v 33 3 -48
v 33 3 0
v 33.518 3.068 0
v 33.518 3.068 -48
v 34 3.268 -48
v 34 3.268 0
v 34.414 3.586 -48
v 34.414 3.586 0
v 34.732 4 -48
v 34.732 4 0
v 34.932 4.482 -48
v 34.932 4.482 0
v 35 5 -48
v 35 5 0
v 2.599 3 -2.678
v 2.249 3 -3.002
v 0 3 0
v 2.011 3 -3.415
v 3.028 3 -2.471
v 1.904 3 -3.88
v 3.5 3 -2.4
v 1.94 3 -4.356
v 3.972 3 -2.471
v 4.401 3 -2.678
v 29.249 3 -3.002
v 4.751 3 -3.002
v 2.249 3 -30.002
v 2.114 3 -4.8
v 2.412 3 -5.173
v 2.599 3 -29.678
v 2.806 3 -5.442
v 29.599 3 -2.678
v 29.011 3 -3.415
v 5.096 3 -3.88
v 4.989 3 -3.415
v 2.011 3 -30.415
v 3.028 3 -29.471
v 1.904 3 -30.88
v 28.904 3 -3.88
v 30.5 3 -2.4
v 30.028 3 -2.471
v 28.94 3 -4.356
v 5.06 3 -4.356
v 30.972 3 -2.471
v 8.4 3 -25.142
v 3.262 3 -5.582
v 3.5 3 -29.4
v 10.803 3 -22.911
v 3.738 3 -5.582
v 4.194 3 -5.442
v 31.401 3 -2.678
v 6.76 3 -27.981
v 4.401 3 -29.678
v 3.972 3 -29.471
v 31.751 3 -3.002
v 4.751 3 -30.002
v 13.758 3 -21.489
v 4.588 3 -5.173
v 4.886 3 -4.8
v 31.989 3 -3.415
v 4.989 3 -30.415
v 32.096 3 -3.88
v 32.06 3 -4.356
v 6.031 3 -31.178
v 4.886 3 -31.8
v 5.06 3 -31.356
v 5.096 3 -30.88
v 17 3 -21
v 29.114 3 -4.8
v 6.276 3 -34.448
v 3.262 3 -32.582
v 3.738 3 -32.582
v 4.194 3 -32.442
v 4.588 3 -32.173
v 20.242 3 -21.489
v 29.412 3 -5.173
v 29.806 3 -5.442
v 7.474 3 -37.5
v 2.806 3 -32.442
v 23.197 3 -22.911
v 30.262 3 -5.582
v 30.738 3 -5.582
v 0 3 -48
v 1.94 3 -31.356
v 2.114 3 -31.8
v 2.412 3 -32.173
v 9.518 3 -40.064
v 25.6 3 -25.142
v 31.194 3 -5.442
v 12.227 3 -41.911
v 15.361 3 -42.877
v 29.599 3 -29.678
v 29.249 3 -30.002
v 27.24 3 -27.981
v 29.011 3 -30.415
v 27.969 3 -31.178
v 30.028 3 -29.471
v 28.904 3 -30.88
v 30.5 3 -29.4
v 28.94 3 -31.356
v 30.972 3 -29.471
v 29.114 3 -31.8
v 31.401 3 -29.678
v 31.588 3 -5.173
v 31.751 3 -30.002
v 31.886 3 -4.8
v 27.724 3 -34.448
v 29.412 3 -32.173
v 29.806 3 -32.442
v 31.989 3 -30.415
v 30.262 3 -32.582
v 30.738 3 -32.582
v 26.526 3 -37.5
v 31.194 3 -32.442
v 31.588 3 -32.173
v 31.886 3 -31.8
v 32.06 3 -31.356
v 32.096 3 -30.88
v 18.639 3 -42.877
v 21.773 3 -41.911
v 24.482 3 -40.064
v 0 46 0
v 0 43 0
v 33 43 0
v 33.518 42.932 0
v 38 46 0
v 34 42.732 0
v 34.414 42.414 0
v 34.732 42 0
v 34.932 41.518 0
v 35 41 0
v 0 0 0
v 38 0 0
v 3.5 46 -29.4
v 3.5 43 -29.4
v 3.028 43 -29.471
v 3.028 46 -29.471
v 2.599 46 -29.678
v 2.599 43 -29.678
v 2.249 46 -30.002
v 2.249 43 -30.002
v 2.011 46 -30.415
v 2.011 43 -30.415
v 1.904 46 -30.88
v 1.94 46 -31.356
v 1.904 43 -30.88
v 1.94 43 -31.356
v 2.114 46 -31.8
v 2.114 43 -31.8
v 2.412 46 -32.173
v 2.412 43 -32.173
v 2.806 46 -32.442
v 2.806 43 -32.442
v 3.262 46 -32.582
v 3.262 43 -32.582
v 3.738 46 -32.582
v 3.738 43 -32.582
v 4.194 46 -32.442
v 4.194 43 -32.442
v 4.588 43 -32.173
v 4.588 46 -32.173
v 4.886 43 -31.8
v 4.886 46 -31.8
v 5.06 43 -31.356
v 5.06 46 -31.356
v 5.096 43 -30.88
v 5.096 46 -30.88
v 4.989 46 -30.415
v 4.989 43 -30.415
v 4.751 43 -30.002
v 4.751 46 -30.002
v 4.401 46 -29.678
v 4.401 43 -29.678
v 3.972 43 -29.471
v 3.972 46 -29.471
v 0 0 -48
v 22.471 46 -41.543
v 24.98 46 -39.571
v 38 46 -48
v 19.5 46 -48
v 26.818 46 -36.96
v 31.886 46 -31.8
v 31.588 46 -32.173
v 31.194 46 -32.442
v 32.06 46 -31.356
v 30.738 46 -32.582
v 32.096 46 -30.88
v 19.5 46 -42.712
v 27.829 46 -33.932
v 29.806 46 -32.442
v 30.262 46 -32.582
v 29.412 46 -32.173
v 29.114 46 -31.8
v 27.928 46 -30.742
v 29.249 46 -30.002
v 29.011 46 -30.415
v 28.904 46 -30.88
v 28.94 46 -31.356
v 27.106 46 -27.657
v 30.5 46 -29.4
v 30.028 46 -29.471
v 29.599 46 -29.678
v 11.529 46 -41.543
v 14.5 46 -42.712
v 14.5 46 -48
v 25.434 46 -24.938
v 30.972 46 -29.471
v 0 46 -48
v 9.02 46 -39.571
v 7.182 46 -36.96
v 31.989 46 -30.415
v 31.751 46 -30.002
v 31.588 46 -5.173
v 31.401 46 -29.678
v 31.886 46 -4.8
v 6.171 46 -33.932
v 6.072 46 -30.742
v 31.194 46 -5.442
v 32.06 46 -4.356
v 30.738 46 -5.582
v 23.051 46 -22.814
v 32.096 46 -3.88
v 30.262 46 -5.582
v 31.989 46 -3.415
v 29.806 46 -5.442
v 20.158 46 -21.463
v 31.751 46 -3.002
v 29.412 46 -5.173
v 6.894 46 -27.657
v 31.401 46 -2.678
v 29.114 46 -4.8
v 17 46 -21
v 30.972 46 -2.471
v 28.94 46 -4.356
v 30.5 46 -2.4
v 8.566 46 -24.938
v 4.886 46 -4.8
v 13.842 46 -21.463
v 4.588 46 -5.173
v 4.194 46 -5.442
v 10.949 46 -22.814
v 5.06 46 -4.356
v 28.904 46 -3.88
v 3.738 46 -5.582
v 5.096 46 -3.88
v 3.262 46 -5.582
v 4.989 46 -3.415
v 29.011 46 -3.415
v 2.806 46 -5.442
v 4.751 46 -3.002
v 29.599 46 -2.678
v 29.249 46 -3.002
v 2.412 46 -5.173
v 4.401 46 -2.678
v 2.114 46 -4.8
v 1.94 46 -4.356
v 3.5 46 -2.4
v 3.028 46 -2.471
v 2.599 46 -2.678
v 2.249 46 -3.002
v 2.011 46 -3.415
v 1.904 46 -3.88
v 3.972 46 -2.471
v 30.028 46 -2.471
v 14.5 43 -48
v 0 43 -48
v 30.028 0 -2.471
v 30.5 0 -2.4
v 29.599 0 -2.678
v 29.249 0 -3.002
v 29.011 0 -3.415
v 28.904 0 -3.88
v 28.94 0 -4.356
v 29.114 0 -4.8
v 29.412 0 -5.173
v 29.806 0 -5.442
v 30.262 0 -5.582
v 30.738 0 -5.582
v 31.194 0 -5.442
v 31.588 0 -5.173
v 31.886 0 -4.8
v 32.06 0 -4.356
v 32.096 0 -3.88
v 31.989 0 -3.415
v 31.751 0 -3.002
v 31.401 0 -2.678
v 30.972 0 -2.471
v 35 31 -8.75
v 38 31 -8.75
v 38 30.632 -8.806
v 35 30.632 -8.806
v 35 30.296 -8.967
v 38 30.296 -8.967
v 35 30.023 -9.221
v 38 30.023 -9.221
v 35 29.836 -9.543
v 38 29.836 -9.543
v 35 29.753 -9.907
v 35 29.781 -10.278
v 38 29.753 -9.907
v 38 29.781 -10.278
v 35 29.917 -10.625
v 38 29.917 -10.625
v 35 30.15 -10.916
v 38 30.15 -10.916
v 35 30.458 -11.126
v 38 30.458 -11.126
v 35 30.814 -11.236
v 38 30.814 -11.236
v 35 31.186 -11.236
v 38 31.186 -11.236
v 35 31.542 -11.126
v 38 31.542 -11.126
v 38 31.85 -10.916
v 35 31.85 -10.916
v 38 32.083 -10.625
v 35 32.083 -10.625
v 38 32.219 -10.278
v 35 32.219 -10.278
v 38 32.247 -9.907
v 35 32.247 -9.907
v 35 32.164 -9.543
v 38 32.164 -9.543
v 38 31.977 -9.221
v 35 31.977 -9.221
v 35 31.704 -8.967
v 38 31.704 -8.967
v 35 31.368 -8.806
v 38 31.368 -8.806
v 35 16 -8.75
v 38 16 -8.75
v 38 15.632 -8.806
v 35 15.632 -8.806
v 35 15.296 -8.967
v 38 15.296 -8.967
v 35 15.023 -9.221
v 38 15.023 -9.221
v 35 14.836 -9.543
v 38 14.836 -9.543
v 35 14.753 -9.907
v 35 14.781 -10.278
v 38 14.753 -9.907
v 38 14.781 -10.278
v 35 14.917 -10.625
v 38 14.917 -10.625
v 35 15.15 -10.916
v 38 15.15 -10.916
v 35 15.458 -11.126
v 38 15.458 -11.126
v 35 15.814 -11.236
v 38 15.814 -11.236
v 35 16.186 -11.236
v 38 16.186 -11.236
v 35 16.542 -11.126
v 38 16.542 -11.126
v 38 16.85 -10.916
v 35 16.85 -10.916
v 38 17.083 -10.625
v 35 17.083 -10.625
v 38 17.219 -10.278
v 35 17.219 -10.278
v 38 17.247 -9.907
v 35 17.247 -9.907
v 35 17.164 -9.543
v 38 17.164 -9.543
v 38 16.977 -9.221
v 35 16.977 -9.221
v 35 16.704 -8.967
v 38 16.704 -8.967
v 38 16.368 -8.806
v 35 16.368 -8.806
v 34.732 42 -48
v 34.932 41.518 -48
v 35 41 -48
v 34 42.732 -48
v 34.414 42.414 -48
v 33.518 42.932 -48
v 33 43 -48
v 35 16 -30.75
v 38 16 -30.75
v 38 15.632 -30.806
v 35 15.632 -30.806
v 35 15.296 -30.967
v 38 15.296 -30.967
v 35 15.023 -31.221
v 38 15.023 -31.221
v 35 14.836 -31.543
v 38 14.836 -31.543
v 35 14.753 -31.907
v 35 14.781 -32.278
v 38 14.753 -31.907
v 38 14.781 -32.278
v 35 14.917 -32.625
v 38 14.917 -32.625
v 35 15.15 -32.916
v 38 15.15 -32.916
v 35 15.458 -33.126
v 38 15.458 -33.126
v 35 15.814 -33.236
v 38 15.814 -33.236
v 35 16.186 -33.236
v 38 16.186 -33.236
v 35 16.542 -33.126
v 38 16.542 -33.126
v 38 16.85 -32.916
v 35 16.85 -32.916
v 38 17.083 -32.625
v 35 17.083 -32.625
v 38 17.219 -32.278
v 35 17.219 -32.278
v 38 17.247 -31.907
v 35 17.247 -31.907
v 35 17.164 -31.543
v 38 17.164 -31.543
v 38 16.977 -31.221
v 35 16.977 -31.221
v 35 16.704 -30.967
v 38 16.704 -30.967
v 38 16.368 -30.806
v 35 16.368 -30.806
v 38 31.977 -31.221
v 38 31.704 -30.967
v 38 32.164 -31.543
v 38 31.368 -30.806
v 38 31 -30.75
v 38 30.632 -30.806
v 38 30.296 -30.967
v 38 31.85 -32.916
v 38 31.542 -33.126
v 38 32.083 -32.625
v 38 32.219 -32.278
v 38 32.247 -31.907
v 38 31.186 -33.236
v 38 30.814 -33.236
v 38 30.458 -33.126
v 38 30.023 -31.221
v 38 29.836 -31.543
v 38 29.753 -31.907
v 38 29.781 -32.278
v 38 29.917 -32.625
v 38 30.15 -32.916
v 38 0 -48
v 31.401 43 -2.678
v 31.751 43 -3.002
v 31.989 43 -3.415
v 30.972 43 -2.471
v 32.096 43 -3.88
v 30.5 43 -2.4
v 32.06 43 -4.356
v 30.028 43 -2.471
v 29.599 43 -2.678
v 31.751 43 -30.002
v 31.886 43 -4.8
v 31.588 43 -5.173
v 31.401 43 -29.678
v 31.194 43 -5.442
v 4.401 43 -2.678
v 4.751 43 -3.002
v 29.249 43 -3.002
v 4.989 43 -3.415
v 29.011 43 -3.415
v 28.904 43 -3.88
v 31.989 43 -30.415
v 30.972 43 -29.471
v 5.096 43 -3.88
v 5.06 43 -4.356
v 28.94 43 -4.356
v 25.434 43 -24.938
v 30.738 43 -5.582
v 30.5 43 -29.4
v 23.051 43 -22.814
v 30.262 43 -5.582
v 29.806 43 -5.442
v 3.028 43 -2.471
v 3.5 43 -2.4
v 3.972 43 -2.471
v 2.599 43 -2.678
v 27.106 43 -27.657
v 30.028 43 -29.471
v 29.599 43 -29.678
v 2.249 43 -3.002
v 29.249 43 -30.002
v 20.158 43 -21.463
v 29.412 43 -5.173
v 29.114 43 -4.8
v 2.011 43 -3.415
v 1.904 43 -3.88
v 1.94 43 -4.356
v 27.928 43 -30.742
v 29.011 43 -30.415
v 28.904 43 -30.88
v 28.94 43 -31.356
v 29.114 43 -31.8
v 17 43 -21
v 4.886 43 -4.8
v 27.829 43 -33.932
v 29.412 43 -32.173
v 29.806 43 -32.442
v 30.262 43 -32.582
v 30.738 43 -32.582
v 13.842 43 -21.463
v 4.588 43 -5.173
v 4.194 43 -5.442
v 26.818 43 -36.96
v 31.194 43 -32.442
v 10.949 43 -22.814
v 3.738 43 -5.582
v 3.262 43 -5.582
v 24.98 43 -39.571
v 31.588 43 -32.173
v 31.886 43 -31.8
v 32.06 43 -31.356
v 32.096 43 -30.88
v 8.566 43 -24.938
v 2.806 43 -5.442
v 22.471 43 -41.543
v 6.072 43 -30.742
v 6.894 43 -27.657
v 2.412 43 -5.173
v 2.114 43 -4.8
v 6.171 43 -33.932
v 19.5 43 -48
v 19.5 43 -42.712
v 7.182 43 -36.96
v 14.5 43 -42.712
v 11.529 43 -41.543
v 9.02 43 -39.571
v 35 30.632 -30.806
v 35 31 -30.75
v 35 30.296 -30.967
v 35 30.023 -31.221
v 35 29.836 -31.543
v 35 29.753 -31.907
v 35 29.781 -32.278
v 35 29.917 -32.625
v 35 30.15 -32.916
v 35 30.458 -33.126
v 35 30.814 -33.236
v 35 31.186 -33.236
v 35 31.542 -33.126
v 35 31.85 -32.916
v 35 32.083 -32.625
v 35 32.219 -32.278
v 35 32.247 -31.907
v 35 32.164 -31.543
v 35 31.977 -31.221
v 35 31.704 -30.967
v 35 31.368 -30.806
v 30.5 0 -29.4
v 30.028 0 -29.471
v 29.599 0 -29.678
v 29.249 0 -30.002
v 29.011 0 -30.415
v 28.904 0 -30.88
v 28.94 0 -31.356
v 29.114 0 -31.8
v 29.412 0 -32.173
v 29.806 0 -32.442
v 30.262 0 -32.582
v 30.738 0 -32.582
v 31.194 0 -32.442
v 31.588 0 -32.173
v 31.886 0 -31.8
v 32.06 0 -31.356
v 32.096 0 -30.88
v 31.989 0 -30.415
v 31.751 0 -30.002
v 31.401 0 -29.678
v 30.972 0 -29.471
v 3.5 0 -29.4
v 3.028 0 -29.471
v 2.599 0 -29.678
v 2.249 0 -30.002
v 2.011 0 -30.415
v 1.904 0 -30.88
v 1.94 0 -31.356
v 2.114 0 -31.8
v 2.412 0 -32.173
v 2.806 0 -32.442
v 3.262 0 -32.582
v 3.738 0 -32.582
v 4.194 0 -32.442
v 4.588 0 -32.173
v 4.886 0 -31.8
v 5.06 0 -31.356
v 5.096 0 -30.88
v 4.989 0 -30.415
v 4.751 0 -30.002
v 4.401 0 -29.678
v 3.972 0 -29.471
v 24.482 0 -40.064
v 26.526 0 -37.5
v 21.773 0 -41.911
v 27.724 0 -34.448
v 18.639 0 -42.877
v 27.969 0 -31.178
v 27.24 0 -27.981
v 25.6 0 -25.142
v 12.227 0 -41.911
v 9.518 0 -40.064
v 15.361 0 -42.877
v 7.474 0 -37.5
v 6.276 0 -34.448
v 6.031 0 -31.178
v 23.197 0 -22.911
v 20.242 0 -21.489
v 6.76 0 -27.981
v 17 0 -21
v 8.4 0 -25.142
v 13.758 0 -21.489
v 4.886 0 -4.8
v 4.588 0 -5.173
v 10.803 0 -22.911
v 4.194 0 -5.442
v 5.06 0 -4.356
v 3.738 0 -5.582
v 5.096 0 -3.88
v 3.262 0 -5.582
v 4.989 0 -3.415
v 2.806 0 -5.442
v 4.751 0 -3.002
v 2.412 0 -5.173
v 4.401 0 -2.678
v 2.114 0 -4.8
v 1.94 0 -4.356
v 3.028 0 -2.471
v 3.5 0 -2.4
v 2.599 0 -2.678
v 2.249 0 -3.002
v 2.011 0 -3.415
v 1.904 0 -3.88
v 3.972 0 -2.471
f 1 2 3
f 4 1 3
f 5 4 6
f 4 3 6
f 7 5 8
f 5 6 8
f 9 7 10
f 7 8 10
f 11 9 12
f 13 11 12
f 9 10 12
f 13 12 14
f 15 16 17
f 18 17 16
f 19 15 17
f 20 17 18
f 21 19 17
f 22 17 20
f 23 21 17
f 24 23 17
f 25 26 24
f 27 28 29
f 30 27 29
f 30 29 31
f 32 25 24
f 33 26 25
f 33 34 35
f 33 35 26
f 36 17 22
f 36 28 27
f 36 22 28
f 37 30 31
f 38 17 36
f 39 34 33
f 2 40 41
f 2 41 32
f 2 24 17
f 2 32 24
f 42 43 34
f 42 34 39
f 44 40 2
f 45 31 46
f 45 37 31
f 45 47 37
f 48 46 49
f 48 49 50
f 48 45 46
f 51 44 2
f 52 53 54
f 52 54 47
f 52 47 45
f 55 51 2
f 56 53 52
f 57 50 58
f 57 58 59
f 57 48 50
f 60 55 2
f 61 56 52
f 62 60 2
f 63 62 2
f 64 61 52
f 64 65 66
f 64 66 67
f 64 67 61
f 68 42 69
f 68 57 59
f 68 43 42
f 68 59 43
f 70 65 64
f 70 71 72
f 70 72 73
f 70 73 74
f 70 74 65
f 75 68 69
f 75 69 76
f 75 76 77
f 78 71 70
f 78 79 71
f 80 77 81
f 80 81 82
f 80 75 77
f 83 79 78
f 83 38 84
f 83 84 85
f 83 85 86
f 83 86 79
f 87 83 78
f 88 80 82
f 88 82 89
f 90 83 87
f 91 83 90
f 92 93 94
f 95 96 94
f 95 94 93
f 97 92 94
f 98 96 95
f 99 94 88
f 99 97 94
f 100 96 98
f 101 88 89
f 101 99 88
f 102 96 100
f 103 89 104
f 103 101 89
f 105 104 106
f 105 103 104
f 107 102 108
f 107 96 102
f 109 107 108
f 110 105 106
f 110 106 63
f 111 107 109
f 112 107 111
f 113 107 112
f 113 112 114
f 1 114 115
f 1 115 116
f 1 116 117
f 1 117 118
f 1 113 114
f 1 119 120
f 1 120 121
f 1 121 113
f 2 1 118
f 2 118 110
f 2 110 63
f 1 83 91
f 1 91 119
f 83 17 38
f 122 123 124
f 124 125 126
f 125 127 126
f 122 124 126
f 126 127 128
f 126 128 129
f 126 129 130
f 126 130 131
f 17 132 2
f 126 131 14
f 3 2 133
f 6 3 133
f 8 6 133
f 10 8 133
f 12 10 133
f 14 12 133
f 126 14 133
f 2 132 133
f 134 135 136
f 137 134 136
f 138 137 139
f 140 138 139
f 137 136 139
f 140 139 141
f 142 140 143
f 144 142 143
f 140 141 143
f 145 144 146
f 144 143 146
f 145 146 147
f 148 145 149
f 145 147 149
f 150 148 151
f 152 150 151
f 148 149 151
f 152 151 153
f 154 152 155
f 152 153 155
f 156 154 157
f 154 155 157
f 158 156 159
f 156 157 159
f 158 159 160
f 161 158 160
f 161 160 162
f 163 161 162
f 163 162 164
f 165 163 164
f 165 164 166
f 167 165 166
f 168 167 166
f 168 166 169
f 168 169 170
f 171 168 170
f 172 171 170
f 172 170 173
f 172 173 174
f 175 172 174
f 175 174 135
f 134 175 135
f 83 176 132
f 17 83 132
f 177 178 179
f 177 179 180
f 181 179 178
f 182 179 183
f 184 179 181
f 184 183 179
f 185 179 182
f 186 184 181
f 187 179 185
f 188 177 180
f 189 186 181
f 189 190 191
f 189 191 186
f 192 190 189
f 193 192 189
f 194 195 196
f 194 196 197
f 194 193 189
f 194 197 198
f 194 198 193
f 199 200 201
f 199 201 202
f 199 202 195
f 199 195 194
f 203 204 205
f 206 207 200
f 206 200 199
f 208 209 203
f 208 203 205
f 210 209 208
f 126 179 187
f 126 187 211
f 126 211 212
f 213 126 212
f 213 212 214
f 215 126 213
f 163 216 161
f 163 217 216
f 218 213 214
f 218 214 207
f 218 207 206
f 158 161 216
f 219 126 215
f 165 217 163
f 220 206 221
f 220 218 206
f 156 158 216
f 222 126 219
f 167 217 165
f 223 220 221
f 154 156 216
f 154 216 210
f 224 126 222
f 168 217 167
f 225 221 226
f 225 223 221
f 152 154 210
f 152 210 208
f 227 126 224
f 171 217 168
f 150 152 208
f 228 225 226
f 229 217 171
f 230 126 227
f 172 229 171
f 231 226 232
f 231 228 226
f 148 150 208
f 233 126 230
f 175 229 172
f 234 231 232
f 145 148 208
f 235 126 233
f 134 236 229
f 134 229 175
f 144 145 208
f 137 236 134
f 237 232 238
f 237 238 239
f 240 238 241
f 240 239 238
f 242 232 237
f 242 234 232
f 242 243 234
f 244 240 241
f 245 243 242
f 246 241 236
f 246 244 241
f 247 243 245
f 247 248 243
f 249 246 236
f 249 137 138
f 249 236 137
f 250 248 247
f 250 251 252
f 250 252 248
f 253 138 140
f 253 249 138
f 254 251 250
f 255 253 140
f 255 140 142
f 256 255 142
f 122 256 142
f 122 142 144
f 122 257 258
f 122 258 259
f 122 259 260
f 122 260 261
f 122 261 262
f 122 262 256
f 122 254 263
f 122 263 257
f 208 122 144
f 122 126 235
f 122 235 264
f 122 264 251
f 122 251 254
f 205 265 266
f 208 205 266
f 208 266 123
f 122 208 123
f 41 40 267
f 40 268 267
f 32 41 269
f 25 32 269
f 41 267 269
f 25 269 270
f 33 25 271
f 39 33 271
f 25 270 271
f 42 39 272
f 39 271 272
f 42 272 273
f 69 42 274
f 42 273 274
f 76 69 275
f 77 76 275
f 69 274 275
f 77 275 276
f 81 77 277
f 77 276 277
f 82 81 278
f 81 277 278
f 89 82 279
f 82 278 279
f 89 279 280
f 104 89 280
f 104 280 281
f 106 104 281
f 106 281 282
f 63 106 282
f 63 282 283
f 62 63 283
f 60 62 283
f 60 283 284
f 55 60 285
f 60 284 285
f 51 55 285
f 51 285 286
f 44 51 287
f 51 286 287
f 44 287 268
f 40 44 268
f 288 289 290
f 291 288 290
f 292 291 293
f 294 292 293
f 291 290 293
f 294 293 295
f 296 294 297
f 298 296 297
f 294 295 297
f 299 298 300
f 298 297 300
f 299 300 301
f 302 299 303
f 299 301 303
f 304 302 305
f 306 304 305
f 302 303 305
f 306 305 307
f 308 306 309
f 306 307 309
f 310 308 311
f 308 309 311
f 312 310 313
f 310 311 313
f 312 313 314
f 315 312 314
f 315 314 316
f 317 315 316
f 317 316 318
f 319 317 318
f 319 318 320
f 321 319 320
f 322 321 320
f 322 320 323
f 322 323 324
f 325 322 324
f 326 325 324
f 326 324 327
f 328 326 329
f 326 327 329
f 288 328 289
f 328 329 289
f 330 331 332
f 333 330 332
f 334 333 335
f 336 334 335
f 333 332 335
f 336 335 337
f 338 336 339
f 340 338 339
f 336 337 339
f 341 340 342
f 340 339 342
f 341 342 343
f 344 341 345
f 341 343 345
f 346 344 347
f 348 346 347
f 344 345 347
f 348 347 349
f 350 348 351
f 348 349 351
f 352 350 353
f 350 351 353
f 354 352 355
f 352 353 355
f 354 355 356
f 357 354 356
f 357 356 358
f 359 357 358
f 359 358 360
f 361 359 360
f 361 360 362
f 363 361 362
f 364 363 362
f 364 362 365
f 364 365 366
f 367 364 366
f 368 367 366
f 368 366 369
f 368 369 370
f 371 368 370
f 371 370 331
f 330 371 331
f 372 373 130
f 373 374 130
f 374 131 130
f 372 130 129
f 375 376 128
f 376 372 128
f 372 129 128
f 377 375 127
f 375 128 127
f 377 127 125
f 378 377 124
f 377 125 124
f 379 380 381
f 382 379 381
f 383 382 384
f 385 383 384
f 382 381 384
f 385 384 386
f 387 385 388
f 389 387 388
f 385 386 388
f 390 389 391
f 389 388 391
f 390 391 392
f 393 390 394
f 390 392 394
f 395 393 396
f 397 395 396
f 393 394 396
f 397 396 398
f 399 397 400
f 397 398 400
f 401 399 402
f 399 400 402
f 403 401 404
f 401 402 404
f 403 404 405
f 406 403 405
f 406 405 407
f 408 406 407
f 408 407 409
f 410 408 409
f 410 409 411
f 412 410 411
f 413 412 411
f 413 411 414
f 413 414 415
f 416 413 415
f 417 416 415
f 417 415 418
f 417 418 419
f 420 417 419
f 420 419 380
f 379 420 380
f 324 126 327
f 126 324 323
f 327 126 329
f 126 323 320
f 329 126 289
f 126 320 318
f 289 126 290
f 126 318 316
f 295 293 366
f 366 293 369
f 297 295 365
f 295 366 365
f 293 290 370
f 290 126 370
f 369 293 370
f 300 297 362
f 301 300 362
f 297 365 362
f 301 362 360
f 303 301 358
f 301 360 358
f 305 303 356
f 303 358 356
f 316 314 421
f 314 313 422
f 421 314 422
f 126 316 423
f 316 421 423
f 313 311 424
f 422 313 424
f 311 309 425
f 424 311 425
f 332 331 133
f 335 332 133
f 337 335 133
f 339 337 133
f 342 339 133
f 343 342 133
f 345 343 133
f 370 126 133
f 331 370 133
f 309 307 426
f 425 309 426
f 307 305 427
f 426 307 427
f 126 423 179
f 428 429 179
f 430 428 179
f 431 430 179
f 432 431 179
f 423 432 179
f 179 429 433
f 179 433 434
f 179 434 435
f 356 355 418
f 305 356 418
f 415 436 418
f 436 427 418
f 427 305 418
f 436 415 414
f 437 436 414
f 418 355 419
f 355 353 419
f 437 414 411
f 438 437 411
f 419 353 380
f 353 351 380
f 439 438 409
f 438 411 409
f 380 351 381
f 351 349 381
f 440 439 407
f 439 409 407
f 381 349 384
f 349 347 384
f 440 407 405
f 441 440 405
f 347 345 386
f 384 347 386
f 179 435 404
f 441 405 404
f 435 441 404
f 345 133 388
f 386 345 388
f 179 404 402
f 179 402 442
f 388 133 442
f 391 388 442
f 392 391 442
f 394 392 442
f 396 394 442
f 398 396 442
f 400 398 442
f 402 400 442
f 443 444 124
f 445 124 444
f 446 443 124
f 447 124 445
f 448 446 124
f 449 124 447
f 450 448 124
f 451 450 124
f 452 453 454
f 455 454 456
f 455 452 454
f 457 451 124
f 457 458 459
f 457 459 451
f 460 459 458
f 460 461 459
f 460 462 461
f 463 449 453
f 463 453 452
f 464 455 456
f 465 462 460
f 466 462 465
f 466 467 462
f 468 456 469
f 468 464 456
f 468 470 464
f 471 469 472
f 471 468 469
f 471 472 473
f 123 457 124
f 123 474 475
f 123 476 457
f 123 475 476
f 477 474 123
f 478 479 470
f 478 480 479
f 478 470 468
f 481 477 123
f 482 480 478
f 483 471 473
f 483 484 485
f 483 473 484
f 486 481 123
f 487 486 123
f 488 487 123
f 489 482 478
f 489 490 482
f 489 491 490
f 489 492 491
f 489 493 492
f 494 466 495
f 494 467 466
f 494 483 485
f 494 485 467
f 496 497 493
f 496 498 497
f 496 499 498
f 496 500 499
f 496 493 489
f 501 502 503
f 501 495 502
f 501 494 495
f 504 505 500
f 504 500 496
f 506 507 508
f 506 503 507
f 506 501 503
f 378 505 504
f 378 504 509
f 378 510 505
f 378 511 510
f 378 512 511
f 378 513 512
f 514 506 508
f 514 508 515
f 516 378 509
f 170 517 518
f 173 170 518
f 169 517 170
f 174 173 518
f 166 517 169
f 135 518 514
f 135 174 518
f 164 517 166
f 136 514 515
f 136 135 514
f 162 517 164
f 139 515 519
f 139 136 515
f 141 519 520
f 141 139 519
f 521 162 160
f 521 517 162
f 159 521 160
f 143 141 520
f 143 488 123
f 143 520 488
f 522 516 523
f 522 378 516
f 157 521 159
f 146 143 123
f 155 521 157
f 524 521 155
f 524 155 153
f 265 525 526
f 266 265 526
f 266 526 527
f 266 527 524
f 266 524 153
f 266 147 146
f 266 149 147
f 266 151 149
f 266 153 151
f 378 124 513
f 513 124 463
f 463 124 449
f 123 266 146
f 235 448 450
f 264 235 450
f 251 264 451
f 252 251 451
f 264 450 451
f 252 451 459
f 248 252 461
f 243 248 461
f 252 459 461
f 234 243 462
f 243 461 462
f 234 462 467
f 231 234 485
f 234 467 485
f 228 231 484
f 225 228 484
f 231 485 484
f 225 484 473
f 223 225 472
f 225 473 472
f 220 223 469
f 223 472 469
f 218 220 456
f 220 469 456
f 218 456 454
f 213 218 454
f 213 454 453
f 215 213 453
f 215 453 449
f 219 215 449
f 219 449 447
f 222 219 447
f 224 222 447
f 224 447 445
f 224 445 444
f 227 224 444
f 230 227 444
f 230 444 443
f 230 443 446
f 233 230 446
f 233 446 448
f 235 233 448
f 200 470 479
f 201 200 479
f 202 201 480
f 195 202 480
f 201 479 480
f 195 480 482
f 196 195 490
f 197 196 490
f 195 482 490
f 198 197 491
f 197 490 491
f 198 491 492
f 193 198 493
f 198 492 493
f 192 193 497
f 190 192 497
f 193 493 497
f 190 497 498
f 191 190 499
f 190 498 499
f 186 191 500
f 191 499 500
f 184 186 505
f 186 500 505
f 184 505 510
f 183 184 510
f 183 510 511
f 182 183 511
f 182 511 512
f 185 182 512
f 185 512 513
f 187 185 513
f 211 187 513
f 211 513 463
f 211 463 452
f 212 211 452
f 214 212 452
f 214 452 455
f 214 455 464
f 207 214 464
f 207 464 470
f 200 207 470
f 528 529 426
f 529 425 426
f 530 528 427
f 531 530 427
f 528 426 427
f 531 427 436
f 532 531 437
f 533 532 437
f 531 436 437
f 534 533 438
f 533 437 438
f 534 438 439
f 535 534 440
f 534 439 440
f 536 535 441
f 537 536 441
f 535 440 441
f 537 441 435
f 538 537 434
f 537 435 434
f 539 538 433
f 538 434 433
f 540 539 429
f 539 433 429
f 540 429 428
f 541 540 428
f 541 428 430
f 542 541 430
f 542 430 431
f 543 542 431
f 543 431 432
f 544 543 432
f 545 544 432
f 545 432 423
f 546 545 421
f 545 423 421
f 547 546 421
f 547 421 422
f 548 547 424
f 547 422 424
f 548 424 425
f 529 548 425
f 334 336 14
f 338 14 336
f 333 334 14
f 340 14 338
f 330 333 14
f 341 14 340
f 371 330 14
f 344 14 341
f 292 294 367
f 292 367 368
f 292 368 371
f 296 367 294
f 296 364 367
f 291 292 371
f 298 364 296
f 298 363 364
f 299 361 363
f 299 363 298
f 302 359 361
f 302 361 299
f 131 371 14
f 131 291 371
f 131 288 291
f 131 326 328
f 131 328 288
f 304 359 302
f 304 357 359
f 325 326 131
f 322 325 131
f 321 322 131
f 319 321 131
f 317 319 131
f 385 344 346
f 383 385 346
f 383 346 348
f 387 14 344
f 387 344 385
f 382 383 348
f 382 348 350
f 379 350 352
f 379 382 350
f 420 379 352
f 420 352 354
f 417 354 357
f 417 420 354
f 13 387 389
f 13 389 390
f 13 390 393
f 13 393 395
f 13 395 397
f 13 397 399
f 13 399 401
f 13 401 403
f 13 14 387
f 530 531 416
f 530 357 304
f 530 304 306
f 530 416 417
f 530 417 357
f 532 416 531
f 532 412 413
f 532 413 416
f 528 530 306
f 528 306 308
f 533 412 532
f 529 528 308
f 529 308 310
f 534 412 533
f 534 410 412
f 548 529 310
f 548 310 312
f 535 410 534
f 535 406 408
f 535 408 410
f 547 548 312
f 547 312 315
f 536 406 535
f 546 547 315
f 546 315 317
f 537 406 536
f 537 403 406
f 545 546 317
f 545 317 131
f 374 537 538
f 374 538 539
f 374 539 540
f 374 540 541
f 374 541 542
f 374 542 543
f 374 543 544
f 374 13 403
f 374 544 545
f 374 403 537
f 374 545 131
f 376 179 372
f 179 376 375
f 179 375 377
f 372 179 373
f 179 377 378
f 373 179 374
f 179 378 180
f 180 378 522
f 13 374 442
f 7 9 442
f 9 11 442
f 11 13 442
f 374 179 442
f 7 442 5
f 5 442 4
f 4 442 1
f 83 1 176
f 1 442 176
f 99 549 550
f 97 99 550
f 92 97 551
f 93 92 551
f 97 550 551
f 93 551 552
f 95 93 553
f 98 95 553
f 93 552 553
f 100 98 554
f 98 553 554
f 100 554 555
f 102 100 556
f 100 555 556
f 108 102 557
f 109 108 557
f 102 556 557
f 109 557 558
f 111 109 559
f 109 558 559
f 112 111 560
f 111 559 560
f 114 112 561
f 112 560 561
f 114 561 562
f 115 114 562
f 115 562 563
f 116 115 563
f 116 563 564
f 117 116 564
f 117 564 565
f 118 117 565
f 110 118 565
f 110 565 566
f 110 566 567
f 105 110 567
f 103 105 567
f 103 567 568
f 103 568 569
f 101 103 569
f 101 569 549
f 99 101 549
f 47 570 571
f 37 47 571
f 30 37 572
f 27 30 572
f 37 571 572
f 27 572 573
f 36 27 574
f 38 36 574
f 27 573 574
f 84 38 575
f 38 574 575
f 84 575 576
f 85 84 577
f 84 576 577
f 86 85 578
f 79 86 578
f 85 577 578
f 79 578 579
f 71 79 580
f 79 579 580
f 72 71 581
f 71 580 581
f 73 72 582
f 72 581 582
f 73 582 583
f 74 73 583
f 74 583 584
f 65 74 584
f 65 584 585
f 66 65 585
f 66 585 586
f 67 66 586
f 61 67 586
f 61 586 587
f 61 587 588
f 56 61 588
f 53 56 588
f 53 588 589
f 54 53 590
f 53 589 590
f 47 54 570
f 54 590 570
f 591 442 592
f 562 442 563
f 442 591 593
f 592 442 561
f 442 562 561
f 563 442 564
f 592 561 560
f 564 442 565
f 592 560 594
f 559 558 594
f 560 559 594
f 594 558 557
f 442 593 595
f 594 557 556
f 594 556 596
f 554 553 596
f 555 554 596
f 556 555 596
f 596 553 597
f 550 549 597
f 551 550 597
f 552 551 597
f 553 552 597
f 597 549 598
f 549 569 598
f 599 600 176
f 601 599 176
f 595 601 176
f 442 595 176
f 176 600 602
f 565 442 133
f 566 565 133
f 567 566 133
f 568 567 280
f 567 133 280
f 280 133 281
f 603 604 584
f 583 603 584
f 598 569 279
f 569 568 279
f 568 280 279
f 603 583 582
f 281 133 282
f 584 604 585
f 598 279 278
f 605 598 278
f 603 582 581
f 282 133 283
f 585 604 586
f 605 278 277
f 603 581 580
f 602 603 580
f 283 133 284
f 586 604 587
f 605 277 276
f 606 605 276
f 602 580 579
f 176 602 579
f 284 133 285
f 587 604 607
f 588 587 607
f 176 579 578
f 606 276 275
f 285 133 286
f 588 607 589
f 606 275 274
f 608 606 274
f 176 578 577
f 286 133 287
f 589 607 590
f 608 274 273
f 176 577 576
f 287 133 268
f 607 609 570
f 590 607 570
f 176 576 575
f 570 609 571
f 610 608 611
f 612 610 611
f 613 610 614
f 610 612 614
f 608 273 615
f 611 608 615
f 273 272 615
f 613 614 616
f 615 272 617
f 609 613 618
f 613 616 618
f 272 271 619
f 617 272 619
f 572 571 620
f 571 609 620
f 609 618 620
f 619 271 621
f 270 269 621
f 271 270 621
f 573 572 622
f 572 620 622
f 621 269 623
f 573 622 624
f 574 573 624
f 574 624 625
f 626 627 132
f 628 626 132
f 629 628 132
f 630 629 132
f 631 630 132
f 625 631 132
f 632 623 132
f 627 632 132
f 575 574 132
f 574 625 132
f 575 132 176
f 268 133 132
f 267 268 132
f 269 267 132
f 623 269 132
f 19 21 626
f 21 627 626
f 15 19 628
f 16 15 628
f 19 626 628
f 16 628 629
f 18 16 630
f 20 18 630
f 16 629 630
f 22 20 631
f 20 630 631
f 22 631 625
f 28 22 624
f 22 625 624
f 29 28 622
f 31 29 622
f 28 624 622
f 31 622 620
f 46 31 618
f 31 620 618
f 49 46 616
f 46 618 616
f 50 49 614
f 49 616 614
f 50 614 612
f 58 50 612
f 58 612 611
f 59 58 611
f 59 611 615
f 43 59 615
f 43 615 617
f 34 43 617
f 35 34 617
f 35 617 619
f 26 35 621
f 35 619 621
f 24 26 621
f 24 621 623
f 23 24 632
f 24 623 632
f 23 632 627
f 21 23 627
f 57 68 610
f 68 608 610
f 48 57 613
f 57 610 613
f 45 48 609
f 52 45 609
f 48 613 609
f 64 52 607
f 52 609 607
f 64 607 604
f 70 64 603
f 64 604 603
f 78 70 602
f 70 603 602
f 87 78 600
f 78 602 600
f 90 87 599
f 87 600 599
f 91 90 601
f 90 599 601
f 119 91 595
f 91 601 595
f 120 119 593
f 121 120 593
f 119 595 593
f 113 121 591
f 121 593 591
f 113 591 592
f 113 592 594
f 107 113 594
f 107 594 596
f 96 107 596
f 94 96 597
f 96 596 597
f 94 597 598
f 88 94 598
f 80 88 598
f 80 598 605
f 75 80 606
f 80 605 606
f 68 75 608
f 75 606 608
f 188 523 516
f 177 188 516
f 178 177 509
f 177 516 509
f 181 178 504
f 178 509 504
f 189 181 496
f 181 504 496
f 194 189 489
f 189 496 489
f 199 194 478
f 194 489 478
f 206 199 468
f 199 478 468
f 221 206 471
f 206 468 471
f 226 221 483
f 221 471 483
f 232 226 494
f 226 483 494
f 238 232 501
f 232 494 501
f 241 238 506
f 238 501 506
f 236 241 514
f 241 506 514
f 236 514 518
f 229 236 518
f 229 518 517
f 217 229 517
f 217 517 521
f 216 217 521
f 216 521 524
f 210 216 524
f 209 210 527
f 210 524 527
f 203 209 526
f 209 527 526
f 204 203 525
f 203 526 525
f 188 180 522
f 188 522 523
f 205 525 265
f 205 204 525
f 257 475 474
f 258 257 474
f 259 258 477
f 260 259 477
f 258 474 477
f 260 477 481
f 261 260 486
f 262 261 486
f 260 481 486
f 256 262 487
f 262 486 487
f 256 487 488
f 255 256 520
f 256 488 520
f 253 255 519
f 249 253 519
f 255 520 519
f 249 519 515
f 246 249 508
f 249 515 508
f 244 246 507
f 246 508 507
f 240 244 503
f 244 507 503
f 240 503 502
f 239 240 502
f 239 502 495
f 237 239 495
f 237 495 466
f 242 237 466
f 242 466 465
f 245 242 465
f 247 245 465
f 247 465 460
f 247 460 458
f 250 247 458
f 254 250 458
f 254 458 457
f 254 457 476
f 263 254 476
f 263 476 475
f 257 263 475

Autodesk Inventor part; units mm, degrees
ref_plane "YZ Plane" through (0, 0, 0) normal (1, 0, 0) x (0, 1, 0)
ref_plane "XZ Plane" through (0, 0, 0) normal (0, 1, 0) x (-1, 0, 0)
ref_plane "XY Plane" through (0, 0, 0) normal (0, 0, 1) x (1, 0, 0)
sketch "スケッチ1" plane through (0, 0, 0) normal (0, 1, 0) x (-1, 0, 0)
  line L0 (0, 0) -> (-38, 0)
  line L1 (-38, 0) -> (-38, -48)
  line L2 (-38, -48) -> (0, -48)
  line L3 (0, -48) -> (0, 0)
  dimension "d0" = 48
  dimension "d1" = 38
extrude "押し出し1" add sketch "スケッチ1" along normal blind 46
sketch "スケッチ2" plane through (38, 0, -48) normal (0, 0, -1) x (-1, 0, 0)
  line L0 (3, 43) -> (59.072, 43)
  line L1 (59.072, 43) -> (59.072, 3)
  line L2 (59.072, 3) -> (3, 3)
  line L3 (3, 3) -> (3, 43)
  line L4 (0, 46) -> (38, 46) projected
  line L5 (0, 0) -> (38, 0) projected
  line L6 (0, 0) -> (0, 46) projected
  dimension "d4" = 40
  dimension "d6" = 3
  dimension "d7" = 3
extrude "押し出し2" cut sketch "スケッチ2" against normal blind 100
sketch "スケッチ3" plane through (0, 46, 0) normal (0, 1, 0) x (1, 0, 0)
  line L0 (38, 48) -> (0, 48) projected
  line L1 (38, 0) -> (38, 48) projected
  point P0 (0, 0)
  point P1 (17, 32)
  dimension "d10" = 16
  dimension "d11" = 21
hole "穴1" at (17, 46, -32) direction (0, -1, 0) diameter 22 end through all
sketch "スケッチ4" plane through (0, 46, 0) normal (0, 1, 0) x (1, 0, 0)
  line L0 (0, 0) -> (38, 0) projected
  line L1 (38, 0) -> (38, 48) projected
  point P0 (30.5, 4)
  point P1 (30.5, 31)
  point P2 (3.5, 4)
  point P3 (3.5, 31)
  point P4 (3.5, 4)
  dimension "d19" = 4
  dimension "d20" = 7.5
  dimension "d23" = 27
  dimension "d26" = 27
hole "穴2" at (30.5, 46, -4) at (30.5, 46, -31) at (3.5, 46, -31) at (3.5, 46, -4) direction (0, -1, 0) diameter 3.2 end through all
sketch "スケッチ6" plane through (38, 0, 0) normal (1, 0, 0) x (0, 0, -1)
  line L0 (0, 46) -> (48, 46) projected
  line L1 (0, 0) -> (0, 46) projected
  point P0 (10, 31)
  point P1 (32, 31)
  point P2 (10, 16)
  point P3 (32, 16)
  dimension "d45" = 15
  dimension "d46" = 10
  dimension "d49" = 22
  dimension "d52" = 15
fillet "フィレット1" radius 2 2 edges at (35, 3, -24) (35, 43, -24)
sketch "スケッチ8" plane through (35, 5, -48) normal (-1, 0, 0) x (0, 0, 1)
  line L0 (16, 11) -> (38, 11)
  line L1 (38, 11) -> (38, 26)
  line L2 (38, 26) -> (16, 26)
  line L3 (16, 26) -> (16, 11)
  line L4 (48, 36) -> (48, 0) projected
  line L5 (48, 41) -> (0, 41) projected
  point P0 (48, -5)
  dimension "d73" = 10
  dimension "d74" = 22
  dimension "d75" = 15
  dimension "d76" = 15
hole "穴5" at (35, 16, -10) at (35, 16, -32) at (35, 31, -32) at (35, 31, -10) direction (1, 0, 0) diameter 2.5 end through all
sketch "スケッチ9" plane through (0, 46, 0) normal (0, 1, 0) x (1, 0, 0)
  line L0 (0, 48) -> (33, 48) projected
  line L1 (14.5, 48) -> (19.5, 48)
  line L2 (19.5, 48) -> (19.5, 38.0378)
  line L3 (19.5, 38.0378) -> (14.5, 38.0378)
  line L4 (14.5, 38.0378) -> (14.5, 48)
  circle A0 centre (17, 32) radius 11 projected
  point P0 (0, 0)
  point P1 (14.5, 42.7121)
  point P2 (19.5, 42.7121)
  dimension "d84" = 5
  dimension "d85" = 2.5
extrude "押し出し4" cut sketch "スケッチ9" against normal blind 3 contours L0 L2 A0 L4
properties part number "サーボモータ固定２軸"
